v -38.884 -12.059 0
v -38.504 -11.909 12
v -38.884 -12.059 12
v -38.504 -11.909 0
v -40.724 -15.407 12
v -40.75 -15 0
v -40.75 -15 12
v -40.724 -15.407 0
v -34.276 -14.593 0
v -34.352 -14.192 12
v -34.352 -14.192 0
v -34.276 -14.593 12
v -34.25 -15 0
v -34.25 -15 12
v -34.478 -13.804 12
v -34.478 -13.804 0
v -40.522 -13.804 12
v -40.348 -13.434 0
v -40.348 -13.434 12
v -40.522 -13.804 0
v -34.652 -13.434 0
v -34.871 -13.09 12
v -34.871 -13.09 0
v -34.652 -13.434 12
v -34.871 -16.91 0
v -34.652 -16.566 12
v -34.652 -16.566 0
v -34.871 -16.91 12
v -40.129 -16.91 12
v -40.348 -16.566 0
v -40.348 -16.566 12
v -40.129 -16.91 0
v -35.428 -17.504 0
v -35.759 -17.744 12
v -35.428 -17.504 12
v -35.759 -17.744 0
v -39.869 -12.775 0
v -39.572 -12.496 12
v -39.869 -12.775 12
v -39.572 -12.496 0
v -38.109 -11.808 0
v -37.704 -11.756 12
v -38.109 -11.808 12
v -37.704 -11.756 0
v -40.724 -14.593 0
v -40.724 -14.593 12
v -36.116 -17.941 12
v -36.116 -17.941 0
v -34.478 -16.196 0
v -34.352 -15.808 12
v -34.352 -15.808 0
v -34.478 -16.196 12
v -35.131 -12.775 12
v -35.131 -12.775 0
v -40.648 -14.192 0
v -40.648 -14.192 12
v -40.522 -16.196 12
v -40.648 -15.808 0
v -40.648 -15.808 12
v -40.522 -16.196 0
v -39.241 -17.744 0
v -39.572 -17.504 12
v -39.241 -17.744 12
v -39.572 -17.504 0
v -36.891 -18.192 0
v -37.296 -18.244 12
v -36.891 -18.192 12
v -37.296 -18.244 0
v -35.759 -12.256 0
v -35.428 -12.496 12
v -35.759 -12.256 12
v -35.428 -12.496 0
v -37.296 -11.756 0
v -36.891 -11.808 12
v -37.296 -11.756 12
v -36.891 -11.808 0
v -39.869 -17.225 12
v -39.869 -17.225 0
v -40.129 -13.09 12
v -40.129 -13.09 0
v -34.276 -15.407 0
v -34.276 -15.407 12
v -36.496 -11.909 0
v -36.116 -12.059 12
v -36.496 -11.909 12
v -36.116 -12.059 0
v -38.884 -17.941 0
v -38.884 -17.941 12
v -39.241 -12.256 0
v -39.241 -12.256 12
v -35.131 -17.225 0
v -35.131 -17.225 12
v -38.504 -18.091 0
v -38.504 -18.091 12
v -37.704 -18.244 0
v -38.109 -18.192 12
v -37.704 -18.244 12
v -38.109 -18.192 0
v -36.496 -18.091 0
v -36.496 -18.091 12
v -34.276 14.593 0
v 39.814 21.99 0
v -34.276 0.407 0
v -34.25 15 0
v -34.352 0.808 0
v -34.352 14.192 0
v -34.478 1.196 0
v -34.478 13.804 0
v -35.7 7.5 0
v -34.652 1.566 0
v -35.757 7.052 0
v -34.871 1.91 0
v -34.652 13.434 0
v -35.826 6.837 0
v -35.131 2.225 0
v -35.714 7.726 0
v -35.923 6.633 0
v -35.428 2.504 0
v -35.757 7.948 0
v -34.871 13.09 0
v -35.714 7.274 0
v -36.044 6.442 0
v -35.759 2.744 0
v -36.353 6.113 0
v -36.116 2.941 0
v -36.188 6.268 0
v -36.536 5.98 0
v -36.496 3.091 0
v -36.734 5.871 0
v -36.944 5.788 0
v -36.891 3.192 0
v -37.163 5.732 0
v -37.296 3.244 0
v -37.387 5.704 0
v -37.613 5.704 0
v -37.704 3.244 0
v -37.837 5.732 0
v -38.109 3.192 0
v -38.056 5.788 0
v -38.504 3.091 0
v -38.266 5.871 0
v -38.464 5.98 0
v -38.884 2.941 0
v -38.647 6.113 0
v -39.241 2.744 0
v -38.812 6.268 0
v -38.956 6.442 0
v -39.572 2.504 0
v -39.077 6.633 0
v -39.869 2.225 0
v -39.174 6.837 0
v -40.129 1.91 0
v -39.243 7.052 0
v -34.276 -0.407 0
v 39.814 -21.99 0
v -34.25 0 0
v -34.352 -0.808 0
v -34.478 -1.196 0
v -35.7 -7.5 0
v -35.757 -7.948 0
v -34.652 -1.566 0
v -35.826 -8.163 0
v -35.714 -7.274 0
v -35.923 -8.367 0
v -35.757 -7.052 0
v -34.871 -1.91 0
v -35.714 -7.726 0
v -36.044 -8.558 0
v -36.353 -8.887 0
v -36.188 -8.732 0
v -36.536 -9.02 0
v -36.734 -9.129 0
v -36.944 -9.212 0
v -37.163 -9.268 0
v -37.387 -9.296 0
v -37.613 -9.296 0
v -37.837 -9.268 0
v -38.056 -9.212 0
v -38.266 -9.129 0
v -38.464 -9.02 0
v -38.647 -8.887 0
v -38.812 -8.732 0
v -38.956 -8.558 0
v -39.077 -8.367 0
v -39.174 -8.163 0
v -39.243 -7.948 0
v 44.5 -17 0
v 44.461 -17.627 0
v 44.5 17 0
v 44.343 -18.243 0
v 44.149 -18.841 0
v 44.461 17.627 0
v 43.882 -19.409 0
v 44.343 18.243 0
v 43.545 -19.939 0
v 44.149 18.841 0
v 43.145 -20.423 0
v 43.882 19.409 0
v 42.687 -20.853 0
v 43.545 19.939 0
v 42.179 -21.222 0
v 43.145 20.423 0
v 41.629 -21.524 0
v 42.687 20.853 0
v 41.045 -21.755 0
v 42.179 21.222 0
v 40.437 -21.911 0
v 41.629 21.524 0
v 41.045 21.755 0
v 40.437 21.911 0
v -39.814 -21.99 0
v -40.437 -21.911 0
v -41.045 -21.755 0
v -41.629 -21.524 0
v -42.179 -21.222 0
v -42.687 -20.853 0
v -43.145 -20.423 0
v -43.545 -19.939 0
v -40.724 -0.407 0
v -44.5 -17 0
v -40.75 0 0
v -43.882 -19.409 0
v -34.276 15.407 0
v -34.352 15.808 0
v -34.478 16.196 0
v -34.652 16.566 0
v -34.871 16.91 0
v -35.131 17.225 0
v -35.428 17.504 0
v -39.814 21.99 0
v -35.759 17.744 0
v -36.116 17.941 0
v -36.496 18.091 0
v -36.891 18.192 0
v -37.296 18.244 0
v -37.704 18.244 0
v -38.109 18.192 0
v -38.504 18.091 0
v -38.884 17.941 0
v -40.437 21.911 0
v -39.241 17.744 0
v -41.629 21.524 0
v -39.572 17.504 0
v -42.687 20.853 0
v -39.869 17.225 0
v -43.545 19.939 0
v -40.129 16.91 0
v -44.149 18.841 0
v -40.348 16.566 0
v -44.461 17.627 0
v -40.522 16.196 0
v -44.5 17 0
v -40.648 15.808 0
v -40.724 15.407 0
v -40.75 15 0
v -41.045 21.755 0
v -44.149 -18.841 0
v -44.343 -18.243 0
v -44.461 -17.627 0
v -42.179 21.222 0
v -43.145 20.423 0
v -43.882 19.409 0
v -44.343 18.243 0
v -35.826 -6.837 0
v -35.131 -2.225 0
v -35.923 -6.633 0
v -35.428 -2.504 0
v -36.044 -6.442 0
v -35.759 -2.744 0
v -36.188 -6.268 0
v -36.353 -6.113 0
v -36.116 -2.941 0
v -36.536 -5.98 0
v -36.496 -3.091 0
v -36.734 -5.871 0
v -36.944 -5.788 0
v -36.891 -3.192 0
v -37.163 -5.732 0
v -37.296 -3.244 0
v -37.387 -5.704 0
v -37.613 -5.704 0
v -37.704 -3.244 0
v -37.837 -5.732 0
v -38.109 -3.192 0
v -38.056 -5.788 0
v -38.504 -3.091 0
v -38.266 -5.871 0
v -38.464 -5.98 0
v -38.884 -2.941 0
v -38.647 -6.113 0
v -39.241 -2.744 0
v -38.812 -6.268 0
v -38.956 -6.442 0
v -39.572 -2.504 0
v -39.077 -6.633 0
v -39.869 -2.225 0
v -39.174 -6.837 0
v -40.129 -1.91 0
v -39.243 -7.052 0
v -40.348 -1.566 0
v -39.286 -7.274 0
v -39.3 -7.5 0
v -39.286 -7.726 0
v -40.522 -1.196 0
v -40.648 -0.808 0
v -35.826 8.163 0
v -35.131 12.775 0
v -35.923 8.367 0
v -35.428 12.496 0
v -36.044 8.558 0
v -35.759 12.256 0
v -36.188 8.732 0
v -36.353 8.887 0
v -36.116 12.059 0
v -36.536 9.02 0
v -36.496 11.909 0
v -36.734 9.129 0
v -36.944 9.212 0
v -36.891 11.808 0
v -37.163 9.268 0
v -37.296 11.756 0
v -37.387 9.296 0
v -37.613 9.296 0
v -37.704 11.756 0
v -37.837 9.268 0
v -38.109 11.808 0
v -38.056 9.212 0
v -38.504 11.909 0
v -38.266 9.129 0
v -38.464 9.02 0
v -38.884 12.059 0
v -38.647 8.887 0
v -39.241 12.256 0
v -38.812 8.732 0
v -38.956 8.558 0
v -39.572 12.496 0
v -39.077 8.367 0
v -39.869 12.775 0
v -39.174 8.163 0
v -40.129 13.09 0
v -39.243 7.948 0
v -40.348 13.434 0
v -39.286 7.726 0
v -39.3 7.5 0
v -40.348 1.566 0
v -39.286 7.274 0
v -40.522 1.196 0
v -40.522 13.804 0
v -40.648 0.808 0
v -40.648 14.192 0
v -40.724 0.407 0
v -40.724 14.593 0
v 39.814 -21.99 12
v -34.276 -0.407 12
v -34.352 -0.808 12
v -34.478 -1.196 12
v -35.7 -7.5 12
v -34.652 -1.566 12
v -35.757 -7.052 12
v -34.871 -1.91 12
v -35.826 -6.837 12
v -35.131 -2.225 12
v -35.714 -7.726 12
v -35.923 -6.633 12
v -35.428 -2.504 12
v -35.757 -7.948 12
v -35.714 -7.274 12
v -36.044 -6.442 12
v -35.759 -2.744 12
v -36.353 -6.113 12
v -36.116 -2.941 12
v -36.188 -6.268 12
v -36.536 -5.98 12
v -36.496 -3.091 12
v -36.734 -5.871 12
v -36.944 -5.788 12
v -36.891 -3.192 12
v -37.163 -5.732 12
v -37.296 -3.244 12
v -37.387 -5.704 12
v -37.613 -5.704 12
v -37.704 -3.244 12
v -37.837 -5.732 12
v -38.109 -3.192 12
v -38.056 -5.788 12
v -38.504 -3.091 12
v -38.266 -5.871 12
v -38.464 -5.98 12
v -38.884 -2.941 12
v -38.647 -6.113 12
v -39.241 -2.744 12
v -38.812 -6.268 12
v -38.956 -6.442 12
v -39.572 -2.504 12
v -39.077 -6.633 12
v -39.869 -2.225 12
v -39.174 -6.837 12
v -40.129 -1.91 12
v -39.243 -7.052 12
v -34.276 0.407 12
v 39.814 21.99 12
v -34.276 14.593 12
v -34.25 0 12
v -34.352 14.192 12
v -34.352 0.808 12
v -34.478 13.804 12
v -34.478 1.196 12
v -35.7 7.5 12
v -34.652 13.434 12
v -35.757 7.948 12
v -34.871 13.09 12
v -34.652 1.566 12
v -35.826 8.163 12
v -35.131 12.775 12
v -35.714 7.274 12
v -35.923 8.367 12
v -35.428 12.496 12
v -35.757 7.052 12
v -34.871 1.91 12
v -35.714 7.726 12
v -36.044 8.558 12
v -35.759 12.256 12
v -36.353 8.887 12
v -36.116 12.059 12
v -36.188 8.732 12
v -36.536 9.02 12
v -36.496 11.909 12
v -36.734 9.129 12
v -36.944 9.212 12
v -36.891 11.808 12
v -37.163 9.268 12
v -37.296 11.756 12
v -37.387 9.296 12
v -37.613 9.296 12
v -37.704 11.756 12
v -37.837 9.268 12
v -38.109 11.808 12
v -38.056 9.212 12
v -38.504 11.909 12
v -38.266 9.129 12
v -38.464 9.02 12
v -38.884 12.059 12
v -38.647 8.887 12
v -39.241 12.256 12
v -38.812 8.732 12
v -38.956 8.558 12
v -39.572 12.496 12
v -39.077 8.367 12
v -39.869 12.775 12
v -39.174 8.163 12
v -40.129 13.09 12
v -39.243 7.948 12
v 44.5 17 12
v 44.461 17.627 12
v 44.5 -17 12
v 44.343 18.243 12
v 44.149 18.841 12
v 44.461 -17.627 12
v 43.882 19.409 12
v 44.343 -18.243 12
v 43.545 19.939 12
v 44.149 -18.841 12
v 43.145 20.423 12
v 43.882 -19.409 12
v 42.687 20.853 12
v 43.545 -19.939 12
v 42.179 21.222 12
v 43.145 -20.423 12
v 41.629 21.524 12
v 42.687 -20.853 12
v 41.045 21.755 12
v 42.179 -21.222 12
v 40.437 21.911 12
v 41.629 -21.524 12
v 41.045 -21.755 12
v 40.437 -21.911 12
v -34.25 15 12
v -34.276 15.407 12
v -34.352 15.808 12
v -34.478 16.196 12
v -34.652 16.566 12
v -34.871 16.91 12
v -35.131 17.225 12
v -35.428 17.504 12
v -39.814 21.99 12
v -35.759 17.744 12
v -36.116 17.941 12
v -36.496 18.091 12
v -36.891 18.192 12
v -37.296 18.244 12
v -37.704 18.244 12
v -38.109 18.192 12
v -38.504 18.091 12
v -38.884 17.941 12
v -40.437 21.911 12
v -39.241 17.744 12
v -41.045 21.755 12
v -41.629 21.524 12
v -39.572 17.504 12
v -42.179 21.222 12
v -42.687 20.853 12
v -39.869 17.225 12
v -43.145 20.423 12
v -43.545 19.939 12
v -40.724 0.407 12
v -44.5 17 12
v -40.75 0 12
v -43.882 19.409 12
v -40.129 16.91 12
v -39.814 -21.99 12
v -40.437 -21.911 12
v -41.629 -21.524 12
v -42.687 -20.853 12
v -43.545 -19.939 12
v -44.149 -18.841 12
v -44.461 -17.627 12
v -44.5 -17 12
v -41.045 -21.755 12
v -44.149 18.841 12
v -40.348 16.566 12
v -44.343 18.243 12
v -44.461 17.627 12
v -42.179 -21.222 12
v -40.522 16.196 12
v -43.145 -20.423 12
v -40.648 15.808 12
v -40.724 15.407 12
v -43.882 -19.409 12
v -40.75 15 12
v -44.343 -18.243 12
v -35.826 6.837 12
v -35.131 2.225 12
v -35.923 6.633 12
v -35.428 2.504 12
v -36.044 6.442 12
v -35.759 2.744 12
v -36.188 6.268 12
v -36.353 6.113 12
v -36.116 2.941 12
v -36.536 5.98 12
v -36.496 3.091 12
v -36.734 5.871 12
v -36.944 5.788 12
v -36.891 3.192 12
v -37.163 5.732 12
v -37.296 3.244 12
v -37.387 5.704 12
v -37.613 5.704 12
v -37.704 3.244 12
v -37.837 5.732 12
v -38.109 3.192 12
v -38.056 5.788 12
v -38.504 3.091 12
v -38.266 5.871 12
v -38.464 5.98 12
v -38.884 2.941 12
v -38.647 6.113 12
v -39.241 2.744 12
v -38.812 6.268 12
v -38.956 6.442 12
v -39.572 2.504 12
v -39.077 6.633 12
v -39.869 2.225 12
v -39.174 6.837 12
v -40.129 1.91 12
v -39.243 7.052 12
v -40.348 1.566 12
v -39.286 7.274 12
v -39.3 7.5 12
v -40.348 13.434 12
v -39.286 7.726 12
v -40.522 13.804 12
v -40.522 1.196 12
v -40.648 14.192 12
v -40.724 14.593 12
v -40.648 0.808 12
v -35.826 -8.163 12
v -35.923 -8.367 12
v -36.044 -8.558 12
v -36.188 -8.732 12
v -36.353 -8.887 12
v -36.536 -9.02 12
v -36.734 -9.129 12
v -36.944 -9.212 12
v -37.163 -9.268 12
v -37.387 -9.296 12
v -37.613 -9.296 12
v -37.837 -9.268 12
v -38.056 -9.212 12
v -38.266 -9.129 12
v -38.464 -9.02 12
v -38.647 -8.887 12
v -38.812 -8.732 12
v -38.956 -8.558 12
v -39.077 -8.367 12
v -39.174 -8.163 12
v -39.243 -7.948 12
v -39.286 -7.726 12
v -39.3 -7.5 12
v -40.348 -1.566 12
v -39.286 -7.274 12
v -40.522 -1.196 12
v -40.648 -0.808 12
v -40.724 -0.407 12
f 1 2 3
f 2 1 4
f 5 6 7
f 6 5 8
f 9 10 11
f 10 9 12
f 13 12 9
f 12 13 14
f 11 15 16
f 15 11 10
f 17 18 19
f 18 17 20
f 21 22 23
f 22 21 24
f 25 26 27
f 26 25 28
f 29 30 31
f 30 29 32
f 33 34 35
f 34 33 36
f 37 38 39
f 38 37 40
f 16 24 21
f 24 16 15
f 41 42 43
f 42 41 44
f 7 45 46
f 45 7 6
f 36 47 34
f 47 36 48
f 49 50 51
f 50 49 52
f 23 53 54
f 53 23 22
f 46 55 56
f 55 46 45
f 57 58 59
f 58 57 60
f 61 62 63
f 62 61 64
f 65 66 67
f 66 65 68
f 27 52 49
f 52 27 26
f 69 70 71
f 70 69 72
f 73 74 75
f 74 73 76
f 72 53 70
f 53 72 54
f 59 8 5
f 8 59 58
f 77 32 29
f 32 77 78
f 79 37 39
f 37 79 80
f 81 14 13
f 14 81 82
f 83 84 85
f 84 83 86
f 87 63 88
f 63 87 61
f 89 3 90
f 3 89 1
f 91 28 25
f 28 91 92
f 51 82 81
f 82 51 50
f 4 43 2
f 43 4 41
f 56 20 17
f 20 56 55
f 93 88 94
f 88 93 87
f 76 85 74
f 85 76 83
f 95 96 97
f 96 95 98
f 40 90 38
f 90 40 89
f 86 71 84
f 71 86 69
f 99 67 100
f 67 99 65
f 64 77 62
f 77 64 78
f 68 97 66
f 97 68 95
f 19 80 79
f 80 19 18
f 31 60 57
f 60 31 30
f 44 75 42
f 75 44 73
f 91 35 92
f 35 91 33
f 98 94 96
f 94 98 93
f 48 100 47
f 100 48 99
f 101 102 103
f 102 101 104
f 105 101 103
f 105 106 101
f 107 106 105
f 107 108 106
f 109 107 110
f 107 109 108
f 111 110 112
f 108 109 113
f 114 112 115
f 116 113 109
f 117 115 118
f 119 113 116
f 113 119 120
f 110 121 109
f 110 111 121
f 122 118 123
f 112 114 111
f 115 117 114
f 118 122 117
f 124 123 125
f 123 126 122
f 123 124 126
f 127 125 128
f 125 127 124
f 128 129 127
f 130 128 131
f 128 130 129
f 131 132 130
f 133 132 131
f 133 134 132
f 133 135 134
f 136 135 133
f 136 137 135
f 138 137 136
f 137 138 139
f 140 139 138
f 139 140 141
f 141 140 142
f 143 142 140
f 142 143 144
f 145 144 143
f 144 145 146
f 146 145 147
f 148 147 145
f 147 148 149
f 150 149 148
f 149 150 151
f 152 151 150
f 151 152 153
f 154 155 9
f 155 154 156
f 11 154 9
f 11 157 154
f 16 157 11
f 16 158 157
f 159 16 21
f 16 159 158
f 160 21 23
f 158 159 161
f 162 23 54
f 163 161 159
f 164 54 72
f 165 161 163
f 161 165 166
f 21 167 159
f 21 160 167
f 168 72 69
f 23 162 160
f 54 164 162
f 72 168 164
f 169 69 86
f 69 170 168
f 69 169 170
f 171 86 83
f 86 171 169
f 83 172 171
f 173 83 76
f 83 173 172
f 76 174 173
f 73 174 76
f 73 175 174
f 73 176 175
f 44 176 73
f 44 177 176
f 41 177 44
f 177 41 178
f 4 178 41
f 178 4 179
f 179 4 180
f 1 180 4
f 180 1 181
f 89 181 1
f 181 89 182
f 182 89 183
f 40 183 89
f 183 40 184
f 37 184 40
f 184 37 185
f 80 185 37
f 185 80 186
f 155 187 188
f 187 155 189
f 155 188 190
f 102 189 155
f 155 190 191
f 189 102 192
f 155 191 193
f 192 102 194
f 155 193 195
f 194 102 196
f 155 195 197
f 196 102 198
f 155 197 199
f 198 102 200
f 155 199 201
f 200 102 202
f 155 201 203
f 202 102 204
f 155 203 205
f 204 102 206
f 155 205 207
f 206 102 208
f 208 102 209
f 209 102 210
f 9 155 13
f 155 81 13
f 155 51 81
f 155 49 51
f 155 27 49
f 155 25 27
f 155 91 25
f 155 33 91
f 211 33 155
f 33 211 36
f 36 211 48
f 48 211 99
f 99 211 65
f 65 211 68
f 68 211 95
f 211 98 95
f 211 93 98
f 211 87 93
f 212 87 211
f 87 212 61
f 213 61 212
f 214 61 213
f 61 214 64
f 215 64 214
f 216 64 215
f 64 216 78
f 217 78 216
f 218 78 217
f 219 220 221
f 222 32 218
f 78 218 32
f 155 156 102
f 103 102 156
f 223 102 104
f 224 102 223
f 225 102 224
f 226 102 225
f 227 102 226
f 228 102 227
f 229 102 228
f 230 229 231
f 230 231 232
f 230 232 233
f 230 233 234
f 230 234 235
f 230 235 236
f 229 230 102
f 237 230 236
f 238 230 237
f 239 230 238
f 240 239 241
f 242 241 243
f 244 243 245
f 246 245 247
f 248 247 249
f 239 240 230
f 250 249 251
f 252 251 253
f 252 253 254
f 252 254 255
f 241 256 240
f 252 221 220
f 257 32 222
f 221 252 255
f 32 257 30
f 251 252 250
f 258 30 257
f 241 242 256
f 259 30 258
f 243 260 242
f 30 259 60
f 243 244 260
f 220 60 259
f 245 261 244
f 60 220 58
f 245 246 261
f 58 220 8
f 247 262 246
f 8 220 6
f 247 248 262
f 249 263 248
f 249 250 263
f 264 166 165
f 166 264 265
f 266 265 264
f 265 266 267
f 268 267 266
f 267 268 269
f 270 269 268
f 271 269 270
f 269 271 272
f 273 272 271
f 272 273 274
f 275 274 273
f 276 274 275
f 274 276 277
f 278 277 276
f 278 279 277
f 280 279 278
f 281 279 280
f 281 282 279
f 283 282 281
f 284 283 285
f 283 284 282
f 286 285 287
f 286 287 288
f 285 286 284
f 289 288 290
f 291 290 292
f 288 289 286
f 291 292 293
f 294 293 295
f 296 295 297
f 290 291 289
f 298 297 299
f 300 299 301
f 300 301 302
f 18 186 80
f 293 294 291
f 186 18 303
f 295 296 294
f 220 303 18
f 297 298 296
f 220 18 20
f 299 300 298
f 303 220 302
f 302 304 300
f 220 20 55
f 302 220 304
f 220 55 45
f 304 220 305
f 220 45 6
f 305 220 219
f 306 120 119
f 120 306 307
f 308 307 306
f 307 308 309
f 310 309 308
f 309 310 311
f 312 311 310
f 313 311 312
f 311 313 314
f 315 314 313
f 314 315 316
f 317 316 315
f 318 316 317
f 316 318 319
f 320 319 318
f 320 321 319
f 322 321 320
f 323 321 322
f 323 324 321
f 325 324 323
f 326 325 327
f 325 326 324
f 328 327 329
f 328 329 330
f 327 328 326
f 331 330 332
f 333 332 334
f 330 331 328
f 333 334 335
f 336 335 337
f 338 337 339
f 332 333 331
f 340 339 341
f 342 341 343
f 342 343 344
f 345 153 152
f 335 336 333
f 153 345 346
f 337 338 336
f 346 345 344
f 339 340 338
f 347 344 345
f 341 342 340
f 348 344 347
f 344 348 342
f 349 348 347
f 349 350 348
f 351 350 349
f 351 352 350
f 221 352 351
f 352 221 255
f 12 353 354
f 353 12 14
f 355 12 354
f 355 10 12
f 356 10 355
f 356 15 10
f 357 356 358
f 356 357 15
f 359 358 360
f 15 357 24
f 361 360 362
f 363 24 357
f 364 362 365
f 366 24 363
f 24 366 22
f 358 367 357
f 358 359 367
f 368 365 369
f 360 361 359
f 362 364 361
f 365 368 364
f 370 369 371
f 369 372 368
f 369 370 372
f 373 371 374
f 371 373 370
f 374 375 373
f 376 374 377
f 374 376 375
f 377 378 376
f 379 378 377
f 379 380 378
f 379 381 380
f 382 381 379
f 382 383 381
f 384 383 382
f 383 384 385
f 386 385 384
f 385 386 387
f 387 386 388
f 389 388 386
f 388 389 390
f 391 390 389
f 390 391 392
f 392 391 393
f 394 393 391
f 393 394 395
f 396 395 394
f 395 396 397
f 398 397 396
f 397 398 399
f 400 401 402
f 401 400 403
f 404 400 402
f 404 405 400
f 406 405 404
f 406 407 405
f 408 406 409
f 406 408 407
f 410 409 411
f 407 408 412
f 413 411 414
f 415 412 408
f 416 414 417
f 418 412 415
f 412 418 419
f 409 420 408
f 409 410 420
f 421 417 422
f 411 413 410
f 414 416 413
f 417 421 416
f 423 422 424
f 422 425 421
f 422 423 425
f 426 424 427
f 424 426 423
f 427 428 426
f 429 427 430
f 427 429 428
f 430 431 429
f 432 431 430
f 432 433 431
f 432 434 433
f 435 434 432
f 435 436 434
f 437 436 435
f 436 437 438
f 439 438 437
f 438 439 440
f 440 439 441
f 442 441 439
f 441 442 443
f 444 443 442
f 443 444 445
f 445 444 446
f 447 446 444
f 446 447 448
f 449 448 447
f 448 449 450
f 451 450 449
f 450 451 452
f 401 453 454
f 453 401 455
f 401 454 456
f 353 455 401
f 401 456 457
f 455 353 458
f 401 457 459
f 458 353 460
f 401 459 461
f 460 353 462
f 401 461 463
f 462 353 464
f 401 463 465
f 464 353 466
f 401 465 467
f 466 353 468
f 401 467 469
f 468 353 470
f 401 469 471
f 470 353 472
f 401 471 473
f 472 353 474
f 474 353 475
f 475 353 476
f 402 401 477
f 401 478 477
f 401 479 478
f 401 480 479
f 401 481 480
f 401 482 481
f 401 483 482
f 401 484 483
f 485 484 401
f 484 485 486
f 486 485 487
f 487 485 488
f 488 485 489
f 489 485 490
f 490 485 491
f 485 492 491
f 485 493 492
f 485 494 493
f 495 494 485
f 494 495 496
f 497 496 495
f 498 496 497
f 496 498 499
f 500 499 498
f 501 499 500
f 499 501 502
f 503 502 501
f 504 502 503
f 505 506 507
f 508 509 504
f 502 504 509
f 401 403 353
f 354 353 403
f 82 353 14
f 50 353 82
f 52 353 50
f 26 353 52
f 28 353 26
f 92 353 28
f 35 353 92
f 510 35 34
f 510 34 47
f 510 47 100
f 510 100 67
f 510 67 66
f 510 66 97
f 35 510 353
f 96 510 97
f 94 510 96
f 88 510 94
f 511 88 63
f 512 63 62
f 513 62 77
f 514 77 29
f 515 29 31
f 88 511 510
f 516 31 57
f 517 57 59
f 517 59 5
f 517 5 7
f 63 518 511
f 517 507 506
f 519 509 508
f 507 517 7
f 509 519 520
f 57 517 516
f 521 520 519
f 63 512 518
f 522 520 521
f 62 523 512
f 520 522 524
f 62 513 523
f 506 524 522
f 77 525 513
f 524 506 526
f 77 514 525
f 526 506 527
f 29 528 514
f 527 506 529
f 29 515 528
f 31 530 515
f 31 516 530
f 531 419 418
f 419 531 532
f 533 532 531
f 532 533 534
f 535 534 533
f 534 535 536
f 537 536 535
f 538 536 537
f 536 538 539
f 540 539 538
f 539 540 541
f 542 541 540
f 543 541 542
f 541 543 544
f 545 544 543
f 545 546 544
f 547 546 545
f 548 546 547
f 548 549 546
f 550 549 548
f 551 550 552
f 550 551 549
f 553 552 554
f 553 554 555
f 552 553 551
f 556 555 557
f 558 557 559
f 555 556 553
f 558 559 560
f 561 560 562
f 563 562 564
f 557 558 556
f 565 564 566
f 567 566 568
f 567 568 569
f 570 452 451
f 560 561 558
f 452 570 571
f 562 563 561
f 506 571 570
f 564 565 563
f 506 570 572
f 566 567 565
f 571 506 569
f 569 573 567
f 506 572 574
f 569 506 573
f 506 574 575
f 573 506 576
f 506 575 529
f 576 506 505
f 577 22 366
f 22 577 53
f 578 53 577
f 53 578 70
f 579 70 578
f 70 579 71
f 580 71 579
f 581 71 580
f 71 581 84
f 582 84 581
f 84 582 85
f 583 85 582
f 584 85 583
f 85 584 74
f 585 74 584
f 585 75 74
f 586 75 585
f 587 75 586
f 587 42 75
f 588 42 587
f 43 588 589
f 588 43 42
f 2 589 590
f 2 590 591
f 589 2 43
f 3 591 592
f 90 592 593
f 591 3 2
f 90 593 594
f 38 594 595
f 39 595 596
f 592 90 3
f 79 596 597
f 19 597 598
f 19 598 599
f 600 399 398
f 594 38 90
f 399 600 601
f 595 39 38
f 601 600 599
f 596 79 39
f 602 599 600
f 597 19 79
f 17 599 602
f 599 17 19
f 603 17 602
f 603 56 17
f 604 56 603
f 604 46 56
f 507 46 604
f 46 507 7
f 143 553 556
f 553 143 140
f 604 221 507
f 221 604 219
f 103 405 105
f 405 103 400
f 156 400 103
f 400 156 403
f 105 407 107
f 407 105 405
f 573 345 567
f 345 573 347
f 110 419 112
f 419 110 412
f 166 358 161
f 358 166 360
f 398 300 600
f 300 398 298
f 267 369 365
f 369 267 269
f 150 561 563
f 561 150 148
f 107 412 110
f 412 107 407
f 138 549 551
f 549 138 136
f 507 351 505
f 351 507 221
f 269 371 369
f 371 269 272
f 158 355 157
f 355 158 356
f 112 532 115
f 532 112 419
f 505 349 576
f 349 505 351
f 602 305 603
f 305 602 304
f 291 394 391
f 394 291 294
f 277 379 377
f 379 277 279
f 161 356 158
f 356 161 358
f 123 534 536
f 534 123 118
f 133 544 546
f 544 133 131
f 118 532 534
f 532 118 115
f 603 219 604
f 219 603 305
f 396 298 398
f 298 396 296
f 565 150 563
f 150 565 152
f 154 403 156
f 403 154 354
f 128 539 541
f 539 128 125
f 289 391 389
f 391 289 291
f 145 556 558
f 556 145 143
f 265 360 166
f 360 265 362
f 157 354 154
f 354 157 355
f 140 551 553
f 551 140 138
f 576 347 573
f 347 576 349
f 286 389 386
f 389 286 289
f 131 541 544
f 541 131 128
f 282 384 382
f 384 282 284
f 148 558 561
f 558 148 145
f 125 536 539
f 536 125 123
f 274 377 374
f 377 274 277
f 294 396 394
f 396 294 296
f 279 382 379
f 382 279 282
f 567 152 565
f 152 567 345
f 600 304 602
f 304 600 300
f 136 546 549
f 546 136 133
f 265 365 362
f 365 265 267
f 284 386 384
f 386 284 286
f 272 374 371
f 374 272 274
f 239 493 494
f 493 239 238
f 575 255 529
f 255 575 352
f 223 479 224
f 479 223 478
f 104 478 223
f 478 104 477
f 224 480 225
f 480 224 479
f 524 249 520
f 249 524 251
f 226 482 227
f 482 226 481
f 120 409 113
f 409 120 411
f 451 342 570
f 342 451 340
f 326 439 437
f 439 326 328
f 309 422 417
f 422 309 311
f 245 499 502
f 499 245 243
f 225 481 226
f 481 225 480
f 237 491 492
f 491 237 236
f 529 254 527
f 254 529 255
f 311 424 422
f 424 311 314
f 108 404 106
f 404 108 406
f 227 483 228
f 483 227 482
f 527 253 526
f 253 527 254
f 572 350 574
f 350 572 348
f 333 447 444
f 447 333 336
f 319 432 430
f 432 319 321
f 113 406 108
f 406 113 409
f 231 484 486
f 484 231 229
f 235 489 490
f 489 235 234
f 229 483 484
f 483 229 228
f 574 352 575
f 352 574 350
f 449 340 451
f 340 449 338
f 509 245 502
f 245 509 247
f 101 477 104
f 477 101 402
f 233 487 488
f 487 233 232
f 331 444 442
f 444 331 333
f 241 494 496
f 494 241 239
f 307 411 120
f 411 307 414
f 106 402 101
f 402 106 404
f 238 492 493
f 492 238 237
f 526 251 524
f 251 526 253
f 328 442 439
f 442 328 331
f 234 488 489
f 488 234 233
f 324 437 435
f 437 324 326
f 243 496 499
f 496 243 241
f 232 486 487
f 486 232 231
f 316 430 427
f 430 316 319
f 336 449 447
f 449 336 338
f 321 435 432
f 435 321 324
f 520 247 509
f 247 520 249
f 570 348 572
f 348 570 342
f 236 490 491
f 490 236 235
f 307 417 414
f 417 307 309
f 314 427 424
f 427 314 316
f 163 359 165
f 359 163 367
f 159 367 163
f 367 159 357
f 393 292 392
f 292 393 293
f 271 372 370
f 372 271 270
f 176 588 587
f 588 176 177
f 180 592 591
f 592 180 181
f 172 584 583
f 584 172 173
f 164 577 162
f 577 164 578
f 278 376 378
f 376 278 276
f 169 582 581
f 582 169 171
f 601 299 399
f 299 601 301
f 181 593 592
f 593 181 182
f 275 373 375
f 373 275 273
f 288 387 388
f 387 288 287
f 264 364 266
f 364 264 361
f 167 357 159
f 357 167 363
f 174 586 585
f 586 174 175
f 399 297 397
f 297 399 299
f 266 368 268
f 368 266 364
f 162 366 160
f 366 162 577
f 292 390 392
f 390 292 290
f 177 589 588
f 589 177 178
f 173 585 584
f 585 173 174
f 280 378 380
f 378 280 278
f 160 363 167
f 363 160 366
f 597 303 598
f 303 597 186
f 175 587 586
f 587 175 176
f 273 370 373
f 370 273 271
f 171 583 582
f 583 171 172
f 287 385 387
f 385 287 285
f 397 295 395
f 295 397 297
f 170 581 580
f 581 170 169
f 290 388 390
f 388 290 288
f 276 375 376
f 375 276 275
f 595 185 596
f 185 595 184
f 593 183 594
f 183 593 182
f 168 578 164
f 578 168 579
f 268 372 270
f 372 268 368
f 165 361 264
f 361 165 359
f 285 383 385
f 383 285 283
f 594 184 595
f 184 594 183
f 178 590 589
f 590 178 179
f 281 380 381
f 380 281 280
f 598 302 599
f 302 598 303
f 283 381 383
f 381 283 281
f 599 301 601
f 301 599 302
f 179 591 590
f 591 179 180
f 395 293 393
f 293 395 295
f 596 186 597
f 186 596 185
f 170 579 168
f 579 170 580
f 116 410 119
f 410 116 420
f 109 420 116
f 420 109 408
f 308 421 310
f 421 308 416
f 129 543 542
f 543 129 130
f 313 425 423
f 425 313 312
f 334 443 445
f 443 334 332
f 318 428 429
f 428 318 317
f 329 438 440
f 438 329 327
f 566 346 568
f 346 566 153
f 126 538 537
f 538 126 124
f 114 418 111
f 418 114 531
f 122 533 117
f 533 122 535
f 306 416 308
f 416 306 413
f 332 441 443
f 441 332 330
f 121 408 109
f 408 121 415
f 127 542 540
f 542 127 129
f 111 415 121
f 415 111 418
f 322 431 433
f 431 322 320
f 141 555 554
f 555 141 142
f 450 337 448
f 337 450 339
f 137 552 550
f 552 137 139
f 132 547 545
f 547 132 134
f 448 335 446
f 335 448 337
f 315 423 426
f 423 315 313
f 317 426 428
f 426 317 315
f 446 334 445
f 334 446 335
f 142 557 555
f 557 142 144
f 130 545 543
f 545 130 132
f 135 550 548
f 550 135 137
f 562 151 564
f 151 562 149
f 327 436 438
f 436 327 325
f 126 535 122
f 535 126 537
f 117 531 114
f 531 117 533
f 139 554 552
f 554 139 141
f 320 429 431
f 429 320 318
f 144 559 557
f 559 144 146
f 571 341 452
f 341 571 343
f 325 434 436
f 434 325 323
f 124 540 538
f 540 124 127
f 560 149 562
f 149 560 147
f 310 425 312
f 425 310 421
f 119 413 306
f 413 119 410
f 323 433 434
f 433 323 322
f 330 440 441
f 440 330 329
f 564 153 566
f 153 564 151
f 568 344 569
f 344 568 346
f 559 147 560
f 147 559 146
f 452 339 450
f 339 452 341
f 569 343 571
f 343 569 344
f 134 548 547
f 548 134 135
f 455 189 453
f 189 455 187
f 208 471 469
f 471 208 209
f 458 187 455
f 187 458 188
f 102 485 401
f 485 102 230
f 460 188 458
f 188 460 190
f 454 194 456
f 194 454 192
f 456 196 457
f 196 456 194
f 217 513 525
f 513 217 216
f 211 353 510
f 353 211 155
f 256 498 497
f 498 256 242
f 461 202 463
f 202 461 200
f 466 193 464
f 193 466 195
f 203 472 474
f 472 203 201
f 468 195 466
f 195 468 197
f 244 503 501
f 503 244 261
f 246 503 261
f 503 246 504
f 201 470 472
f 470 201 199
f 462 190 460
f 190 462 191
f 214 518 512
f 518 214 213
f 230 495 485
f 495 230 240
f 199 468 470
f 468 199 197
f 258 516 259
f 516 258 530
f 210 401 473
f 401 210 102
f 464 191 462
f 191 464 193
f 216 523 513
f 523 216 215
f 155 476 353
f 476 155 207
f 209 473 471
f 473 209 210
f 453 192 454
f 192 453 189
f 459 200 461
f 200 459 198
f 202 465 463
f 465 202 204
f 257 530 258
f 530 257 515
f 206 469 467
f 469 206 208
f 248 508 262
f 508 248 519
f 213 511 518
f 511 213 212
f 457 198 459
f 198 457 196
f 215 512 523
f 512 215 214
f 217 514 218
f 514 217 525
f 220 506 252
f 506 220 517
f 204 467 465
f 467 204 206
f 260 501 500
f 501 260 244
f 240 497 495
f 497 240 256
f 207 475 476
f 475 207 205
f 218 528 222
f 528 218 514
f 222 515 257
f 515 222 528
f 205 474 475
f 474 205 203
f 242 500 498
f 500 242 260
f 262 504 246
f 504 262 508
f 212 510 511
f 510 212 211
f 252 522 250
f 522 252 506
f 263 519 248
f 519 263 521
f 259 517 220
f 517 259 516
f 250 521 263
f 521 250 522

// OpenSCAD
$fn = 50;


difference() {
	union() {
		hull() {
			translate(v = [-39.5000000000, 17.0000000000, 0]) {
				cylinder(h = 12, r = 5);
			}
			translate(v = [39.5000000000, 17.0000000000, 0]) {
				cylinder(h = 12, r = 5);
			}
			translate(v = [-39.5000000000, -17.0000000000, 0]) {
				cylinder(h = 12, r = 5);
			}
			translate(v = [39.5000000000, -17.0000000000, 0]) {
				cylinder(h = 12, r = 5);
			}
		}
	}
	union() {
		translate(v = [-37.5000000000, -15.0000000000, 0]) {
			cylinder(h = 12, r = 3.2500000000);
		}
		translate(v = [-37.5000000000, 0.0000000000, 0]) {
			cylinder(h = 12, r = 3.2500000000);
		}
		translate(v = [-37.5000000000, 15.0000000000, 0]) {
			cylinder(h = 12, r = 3.2500000000);
		}
		translate(v = [-37.5000000000, -15.0000000000, 0]) {
			cylinder(h = 12, r = 1.8000000000);
		}
		translate(v = [-37.5000000000, -7.5000000000, 0]) {
			cylinder(h = 12, r = 1.8000000000);
		}
		translate(v = [-37.5000000000, 0.0000000000, 0]) {
			cylinder(h = 12, r = 1.8000000000);
		}
		translate(v = [-37.5000000000, 7.5000000000, 0]) {
			cylinder(h = 12, r = 1.8000000000);
		}
		translate(v = [-37.5000000000, 15.0000000000, 0]) {
			cylinder(h = 12, r = 1.8000000000);
		}
		translate(v = [-37.5000000000, -15.0000000000, 0]) {
			cylinder(h = 12, r = 1.8000000000);
		}
		translate(v = [-37.5000000000, -7.5000000000, 0]) {
			cylinder(h = 12, r = 1.8000000000);
		}
		translate(v = [-37.5000000000, 0.0000000000, 0]) {
			cylinder(h = 12, r = 1.8000000000);
		}
		translate(v = [-37.5000000000, 7.5000000000, 0]) {
			cylinder(h = 12, r = 1.8000000000);
		}
		translate(v = [-37.5000000000, 15.0000000000, 0]) {
			cylinder(h = 12, r = 1.8000000000);
		}
		translate(v = [-37.5000000000, -15.0000000000, 0]) {
			cylinder(h = 12, r = 1.8000000000);
		}
		translate(v = [-37.5000000000, -7.5000000000, 0]) {
			cylinder(h = 12, r = 1.8000000000);
		}
		translate(v = [-37.5000000000, 0.0000000000, 0]) {
			cylinder(h = 12, r = 1.8000000000);
		}
		translate(v = [-37.5000000000, 7.5000000000, 0]) {
			cylinder(h = 12, r = 1.8000000000);
		}
		translate(v = [-37.5000000000, 15.0000000000, 0]) {
			cylinder(h = 12, r = 1.8000000000);
		}
	}
}
